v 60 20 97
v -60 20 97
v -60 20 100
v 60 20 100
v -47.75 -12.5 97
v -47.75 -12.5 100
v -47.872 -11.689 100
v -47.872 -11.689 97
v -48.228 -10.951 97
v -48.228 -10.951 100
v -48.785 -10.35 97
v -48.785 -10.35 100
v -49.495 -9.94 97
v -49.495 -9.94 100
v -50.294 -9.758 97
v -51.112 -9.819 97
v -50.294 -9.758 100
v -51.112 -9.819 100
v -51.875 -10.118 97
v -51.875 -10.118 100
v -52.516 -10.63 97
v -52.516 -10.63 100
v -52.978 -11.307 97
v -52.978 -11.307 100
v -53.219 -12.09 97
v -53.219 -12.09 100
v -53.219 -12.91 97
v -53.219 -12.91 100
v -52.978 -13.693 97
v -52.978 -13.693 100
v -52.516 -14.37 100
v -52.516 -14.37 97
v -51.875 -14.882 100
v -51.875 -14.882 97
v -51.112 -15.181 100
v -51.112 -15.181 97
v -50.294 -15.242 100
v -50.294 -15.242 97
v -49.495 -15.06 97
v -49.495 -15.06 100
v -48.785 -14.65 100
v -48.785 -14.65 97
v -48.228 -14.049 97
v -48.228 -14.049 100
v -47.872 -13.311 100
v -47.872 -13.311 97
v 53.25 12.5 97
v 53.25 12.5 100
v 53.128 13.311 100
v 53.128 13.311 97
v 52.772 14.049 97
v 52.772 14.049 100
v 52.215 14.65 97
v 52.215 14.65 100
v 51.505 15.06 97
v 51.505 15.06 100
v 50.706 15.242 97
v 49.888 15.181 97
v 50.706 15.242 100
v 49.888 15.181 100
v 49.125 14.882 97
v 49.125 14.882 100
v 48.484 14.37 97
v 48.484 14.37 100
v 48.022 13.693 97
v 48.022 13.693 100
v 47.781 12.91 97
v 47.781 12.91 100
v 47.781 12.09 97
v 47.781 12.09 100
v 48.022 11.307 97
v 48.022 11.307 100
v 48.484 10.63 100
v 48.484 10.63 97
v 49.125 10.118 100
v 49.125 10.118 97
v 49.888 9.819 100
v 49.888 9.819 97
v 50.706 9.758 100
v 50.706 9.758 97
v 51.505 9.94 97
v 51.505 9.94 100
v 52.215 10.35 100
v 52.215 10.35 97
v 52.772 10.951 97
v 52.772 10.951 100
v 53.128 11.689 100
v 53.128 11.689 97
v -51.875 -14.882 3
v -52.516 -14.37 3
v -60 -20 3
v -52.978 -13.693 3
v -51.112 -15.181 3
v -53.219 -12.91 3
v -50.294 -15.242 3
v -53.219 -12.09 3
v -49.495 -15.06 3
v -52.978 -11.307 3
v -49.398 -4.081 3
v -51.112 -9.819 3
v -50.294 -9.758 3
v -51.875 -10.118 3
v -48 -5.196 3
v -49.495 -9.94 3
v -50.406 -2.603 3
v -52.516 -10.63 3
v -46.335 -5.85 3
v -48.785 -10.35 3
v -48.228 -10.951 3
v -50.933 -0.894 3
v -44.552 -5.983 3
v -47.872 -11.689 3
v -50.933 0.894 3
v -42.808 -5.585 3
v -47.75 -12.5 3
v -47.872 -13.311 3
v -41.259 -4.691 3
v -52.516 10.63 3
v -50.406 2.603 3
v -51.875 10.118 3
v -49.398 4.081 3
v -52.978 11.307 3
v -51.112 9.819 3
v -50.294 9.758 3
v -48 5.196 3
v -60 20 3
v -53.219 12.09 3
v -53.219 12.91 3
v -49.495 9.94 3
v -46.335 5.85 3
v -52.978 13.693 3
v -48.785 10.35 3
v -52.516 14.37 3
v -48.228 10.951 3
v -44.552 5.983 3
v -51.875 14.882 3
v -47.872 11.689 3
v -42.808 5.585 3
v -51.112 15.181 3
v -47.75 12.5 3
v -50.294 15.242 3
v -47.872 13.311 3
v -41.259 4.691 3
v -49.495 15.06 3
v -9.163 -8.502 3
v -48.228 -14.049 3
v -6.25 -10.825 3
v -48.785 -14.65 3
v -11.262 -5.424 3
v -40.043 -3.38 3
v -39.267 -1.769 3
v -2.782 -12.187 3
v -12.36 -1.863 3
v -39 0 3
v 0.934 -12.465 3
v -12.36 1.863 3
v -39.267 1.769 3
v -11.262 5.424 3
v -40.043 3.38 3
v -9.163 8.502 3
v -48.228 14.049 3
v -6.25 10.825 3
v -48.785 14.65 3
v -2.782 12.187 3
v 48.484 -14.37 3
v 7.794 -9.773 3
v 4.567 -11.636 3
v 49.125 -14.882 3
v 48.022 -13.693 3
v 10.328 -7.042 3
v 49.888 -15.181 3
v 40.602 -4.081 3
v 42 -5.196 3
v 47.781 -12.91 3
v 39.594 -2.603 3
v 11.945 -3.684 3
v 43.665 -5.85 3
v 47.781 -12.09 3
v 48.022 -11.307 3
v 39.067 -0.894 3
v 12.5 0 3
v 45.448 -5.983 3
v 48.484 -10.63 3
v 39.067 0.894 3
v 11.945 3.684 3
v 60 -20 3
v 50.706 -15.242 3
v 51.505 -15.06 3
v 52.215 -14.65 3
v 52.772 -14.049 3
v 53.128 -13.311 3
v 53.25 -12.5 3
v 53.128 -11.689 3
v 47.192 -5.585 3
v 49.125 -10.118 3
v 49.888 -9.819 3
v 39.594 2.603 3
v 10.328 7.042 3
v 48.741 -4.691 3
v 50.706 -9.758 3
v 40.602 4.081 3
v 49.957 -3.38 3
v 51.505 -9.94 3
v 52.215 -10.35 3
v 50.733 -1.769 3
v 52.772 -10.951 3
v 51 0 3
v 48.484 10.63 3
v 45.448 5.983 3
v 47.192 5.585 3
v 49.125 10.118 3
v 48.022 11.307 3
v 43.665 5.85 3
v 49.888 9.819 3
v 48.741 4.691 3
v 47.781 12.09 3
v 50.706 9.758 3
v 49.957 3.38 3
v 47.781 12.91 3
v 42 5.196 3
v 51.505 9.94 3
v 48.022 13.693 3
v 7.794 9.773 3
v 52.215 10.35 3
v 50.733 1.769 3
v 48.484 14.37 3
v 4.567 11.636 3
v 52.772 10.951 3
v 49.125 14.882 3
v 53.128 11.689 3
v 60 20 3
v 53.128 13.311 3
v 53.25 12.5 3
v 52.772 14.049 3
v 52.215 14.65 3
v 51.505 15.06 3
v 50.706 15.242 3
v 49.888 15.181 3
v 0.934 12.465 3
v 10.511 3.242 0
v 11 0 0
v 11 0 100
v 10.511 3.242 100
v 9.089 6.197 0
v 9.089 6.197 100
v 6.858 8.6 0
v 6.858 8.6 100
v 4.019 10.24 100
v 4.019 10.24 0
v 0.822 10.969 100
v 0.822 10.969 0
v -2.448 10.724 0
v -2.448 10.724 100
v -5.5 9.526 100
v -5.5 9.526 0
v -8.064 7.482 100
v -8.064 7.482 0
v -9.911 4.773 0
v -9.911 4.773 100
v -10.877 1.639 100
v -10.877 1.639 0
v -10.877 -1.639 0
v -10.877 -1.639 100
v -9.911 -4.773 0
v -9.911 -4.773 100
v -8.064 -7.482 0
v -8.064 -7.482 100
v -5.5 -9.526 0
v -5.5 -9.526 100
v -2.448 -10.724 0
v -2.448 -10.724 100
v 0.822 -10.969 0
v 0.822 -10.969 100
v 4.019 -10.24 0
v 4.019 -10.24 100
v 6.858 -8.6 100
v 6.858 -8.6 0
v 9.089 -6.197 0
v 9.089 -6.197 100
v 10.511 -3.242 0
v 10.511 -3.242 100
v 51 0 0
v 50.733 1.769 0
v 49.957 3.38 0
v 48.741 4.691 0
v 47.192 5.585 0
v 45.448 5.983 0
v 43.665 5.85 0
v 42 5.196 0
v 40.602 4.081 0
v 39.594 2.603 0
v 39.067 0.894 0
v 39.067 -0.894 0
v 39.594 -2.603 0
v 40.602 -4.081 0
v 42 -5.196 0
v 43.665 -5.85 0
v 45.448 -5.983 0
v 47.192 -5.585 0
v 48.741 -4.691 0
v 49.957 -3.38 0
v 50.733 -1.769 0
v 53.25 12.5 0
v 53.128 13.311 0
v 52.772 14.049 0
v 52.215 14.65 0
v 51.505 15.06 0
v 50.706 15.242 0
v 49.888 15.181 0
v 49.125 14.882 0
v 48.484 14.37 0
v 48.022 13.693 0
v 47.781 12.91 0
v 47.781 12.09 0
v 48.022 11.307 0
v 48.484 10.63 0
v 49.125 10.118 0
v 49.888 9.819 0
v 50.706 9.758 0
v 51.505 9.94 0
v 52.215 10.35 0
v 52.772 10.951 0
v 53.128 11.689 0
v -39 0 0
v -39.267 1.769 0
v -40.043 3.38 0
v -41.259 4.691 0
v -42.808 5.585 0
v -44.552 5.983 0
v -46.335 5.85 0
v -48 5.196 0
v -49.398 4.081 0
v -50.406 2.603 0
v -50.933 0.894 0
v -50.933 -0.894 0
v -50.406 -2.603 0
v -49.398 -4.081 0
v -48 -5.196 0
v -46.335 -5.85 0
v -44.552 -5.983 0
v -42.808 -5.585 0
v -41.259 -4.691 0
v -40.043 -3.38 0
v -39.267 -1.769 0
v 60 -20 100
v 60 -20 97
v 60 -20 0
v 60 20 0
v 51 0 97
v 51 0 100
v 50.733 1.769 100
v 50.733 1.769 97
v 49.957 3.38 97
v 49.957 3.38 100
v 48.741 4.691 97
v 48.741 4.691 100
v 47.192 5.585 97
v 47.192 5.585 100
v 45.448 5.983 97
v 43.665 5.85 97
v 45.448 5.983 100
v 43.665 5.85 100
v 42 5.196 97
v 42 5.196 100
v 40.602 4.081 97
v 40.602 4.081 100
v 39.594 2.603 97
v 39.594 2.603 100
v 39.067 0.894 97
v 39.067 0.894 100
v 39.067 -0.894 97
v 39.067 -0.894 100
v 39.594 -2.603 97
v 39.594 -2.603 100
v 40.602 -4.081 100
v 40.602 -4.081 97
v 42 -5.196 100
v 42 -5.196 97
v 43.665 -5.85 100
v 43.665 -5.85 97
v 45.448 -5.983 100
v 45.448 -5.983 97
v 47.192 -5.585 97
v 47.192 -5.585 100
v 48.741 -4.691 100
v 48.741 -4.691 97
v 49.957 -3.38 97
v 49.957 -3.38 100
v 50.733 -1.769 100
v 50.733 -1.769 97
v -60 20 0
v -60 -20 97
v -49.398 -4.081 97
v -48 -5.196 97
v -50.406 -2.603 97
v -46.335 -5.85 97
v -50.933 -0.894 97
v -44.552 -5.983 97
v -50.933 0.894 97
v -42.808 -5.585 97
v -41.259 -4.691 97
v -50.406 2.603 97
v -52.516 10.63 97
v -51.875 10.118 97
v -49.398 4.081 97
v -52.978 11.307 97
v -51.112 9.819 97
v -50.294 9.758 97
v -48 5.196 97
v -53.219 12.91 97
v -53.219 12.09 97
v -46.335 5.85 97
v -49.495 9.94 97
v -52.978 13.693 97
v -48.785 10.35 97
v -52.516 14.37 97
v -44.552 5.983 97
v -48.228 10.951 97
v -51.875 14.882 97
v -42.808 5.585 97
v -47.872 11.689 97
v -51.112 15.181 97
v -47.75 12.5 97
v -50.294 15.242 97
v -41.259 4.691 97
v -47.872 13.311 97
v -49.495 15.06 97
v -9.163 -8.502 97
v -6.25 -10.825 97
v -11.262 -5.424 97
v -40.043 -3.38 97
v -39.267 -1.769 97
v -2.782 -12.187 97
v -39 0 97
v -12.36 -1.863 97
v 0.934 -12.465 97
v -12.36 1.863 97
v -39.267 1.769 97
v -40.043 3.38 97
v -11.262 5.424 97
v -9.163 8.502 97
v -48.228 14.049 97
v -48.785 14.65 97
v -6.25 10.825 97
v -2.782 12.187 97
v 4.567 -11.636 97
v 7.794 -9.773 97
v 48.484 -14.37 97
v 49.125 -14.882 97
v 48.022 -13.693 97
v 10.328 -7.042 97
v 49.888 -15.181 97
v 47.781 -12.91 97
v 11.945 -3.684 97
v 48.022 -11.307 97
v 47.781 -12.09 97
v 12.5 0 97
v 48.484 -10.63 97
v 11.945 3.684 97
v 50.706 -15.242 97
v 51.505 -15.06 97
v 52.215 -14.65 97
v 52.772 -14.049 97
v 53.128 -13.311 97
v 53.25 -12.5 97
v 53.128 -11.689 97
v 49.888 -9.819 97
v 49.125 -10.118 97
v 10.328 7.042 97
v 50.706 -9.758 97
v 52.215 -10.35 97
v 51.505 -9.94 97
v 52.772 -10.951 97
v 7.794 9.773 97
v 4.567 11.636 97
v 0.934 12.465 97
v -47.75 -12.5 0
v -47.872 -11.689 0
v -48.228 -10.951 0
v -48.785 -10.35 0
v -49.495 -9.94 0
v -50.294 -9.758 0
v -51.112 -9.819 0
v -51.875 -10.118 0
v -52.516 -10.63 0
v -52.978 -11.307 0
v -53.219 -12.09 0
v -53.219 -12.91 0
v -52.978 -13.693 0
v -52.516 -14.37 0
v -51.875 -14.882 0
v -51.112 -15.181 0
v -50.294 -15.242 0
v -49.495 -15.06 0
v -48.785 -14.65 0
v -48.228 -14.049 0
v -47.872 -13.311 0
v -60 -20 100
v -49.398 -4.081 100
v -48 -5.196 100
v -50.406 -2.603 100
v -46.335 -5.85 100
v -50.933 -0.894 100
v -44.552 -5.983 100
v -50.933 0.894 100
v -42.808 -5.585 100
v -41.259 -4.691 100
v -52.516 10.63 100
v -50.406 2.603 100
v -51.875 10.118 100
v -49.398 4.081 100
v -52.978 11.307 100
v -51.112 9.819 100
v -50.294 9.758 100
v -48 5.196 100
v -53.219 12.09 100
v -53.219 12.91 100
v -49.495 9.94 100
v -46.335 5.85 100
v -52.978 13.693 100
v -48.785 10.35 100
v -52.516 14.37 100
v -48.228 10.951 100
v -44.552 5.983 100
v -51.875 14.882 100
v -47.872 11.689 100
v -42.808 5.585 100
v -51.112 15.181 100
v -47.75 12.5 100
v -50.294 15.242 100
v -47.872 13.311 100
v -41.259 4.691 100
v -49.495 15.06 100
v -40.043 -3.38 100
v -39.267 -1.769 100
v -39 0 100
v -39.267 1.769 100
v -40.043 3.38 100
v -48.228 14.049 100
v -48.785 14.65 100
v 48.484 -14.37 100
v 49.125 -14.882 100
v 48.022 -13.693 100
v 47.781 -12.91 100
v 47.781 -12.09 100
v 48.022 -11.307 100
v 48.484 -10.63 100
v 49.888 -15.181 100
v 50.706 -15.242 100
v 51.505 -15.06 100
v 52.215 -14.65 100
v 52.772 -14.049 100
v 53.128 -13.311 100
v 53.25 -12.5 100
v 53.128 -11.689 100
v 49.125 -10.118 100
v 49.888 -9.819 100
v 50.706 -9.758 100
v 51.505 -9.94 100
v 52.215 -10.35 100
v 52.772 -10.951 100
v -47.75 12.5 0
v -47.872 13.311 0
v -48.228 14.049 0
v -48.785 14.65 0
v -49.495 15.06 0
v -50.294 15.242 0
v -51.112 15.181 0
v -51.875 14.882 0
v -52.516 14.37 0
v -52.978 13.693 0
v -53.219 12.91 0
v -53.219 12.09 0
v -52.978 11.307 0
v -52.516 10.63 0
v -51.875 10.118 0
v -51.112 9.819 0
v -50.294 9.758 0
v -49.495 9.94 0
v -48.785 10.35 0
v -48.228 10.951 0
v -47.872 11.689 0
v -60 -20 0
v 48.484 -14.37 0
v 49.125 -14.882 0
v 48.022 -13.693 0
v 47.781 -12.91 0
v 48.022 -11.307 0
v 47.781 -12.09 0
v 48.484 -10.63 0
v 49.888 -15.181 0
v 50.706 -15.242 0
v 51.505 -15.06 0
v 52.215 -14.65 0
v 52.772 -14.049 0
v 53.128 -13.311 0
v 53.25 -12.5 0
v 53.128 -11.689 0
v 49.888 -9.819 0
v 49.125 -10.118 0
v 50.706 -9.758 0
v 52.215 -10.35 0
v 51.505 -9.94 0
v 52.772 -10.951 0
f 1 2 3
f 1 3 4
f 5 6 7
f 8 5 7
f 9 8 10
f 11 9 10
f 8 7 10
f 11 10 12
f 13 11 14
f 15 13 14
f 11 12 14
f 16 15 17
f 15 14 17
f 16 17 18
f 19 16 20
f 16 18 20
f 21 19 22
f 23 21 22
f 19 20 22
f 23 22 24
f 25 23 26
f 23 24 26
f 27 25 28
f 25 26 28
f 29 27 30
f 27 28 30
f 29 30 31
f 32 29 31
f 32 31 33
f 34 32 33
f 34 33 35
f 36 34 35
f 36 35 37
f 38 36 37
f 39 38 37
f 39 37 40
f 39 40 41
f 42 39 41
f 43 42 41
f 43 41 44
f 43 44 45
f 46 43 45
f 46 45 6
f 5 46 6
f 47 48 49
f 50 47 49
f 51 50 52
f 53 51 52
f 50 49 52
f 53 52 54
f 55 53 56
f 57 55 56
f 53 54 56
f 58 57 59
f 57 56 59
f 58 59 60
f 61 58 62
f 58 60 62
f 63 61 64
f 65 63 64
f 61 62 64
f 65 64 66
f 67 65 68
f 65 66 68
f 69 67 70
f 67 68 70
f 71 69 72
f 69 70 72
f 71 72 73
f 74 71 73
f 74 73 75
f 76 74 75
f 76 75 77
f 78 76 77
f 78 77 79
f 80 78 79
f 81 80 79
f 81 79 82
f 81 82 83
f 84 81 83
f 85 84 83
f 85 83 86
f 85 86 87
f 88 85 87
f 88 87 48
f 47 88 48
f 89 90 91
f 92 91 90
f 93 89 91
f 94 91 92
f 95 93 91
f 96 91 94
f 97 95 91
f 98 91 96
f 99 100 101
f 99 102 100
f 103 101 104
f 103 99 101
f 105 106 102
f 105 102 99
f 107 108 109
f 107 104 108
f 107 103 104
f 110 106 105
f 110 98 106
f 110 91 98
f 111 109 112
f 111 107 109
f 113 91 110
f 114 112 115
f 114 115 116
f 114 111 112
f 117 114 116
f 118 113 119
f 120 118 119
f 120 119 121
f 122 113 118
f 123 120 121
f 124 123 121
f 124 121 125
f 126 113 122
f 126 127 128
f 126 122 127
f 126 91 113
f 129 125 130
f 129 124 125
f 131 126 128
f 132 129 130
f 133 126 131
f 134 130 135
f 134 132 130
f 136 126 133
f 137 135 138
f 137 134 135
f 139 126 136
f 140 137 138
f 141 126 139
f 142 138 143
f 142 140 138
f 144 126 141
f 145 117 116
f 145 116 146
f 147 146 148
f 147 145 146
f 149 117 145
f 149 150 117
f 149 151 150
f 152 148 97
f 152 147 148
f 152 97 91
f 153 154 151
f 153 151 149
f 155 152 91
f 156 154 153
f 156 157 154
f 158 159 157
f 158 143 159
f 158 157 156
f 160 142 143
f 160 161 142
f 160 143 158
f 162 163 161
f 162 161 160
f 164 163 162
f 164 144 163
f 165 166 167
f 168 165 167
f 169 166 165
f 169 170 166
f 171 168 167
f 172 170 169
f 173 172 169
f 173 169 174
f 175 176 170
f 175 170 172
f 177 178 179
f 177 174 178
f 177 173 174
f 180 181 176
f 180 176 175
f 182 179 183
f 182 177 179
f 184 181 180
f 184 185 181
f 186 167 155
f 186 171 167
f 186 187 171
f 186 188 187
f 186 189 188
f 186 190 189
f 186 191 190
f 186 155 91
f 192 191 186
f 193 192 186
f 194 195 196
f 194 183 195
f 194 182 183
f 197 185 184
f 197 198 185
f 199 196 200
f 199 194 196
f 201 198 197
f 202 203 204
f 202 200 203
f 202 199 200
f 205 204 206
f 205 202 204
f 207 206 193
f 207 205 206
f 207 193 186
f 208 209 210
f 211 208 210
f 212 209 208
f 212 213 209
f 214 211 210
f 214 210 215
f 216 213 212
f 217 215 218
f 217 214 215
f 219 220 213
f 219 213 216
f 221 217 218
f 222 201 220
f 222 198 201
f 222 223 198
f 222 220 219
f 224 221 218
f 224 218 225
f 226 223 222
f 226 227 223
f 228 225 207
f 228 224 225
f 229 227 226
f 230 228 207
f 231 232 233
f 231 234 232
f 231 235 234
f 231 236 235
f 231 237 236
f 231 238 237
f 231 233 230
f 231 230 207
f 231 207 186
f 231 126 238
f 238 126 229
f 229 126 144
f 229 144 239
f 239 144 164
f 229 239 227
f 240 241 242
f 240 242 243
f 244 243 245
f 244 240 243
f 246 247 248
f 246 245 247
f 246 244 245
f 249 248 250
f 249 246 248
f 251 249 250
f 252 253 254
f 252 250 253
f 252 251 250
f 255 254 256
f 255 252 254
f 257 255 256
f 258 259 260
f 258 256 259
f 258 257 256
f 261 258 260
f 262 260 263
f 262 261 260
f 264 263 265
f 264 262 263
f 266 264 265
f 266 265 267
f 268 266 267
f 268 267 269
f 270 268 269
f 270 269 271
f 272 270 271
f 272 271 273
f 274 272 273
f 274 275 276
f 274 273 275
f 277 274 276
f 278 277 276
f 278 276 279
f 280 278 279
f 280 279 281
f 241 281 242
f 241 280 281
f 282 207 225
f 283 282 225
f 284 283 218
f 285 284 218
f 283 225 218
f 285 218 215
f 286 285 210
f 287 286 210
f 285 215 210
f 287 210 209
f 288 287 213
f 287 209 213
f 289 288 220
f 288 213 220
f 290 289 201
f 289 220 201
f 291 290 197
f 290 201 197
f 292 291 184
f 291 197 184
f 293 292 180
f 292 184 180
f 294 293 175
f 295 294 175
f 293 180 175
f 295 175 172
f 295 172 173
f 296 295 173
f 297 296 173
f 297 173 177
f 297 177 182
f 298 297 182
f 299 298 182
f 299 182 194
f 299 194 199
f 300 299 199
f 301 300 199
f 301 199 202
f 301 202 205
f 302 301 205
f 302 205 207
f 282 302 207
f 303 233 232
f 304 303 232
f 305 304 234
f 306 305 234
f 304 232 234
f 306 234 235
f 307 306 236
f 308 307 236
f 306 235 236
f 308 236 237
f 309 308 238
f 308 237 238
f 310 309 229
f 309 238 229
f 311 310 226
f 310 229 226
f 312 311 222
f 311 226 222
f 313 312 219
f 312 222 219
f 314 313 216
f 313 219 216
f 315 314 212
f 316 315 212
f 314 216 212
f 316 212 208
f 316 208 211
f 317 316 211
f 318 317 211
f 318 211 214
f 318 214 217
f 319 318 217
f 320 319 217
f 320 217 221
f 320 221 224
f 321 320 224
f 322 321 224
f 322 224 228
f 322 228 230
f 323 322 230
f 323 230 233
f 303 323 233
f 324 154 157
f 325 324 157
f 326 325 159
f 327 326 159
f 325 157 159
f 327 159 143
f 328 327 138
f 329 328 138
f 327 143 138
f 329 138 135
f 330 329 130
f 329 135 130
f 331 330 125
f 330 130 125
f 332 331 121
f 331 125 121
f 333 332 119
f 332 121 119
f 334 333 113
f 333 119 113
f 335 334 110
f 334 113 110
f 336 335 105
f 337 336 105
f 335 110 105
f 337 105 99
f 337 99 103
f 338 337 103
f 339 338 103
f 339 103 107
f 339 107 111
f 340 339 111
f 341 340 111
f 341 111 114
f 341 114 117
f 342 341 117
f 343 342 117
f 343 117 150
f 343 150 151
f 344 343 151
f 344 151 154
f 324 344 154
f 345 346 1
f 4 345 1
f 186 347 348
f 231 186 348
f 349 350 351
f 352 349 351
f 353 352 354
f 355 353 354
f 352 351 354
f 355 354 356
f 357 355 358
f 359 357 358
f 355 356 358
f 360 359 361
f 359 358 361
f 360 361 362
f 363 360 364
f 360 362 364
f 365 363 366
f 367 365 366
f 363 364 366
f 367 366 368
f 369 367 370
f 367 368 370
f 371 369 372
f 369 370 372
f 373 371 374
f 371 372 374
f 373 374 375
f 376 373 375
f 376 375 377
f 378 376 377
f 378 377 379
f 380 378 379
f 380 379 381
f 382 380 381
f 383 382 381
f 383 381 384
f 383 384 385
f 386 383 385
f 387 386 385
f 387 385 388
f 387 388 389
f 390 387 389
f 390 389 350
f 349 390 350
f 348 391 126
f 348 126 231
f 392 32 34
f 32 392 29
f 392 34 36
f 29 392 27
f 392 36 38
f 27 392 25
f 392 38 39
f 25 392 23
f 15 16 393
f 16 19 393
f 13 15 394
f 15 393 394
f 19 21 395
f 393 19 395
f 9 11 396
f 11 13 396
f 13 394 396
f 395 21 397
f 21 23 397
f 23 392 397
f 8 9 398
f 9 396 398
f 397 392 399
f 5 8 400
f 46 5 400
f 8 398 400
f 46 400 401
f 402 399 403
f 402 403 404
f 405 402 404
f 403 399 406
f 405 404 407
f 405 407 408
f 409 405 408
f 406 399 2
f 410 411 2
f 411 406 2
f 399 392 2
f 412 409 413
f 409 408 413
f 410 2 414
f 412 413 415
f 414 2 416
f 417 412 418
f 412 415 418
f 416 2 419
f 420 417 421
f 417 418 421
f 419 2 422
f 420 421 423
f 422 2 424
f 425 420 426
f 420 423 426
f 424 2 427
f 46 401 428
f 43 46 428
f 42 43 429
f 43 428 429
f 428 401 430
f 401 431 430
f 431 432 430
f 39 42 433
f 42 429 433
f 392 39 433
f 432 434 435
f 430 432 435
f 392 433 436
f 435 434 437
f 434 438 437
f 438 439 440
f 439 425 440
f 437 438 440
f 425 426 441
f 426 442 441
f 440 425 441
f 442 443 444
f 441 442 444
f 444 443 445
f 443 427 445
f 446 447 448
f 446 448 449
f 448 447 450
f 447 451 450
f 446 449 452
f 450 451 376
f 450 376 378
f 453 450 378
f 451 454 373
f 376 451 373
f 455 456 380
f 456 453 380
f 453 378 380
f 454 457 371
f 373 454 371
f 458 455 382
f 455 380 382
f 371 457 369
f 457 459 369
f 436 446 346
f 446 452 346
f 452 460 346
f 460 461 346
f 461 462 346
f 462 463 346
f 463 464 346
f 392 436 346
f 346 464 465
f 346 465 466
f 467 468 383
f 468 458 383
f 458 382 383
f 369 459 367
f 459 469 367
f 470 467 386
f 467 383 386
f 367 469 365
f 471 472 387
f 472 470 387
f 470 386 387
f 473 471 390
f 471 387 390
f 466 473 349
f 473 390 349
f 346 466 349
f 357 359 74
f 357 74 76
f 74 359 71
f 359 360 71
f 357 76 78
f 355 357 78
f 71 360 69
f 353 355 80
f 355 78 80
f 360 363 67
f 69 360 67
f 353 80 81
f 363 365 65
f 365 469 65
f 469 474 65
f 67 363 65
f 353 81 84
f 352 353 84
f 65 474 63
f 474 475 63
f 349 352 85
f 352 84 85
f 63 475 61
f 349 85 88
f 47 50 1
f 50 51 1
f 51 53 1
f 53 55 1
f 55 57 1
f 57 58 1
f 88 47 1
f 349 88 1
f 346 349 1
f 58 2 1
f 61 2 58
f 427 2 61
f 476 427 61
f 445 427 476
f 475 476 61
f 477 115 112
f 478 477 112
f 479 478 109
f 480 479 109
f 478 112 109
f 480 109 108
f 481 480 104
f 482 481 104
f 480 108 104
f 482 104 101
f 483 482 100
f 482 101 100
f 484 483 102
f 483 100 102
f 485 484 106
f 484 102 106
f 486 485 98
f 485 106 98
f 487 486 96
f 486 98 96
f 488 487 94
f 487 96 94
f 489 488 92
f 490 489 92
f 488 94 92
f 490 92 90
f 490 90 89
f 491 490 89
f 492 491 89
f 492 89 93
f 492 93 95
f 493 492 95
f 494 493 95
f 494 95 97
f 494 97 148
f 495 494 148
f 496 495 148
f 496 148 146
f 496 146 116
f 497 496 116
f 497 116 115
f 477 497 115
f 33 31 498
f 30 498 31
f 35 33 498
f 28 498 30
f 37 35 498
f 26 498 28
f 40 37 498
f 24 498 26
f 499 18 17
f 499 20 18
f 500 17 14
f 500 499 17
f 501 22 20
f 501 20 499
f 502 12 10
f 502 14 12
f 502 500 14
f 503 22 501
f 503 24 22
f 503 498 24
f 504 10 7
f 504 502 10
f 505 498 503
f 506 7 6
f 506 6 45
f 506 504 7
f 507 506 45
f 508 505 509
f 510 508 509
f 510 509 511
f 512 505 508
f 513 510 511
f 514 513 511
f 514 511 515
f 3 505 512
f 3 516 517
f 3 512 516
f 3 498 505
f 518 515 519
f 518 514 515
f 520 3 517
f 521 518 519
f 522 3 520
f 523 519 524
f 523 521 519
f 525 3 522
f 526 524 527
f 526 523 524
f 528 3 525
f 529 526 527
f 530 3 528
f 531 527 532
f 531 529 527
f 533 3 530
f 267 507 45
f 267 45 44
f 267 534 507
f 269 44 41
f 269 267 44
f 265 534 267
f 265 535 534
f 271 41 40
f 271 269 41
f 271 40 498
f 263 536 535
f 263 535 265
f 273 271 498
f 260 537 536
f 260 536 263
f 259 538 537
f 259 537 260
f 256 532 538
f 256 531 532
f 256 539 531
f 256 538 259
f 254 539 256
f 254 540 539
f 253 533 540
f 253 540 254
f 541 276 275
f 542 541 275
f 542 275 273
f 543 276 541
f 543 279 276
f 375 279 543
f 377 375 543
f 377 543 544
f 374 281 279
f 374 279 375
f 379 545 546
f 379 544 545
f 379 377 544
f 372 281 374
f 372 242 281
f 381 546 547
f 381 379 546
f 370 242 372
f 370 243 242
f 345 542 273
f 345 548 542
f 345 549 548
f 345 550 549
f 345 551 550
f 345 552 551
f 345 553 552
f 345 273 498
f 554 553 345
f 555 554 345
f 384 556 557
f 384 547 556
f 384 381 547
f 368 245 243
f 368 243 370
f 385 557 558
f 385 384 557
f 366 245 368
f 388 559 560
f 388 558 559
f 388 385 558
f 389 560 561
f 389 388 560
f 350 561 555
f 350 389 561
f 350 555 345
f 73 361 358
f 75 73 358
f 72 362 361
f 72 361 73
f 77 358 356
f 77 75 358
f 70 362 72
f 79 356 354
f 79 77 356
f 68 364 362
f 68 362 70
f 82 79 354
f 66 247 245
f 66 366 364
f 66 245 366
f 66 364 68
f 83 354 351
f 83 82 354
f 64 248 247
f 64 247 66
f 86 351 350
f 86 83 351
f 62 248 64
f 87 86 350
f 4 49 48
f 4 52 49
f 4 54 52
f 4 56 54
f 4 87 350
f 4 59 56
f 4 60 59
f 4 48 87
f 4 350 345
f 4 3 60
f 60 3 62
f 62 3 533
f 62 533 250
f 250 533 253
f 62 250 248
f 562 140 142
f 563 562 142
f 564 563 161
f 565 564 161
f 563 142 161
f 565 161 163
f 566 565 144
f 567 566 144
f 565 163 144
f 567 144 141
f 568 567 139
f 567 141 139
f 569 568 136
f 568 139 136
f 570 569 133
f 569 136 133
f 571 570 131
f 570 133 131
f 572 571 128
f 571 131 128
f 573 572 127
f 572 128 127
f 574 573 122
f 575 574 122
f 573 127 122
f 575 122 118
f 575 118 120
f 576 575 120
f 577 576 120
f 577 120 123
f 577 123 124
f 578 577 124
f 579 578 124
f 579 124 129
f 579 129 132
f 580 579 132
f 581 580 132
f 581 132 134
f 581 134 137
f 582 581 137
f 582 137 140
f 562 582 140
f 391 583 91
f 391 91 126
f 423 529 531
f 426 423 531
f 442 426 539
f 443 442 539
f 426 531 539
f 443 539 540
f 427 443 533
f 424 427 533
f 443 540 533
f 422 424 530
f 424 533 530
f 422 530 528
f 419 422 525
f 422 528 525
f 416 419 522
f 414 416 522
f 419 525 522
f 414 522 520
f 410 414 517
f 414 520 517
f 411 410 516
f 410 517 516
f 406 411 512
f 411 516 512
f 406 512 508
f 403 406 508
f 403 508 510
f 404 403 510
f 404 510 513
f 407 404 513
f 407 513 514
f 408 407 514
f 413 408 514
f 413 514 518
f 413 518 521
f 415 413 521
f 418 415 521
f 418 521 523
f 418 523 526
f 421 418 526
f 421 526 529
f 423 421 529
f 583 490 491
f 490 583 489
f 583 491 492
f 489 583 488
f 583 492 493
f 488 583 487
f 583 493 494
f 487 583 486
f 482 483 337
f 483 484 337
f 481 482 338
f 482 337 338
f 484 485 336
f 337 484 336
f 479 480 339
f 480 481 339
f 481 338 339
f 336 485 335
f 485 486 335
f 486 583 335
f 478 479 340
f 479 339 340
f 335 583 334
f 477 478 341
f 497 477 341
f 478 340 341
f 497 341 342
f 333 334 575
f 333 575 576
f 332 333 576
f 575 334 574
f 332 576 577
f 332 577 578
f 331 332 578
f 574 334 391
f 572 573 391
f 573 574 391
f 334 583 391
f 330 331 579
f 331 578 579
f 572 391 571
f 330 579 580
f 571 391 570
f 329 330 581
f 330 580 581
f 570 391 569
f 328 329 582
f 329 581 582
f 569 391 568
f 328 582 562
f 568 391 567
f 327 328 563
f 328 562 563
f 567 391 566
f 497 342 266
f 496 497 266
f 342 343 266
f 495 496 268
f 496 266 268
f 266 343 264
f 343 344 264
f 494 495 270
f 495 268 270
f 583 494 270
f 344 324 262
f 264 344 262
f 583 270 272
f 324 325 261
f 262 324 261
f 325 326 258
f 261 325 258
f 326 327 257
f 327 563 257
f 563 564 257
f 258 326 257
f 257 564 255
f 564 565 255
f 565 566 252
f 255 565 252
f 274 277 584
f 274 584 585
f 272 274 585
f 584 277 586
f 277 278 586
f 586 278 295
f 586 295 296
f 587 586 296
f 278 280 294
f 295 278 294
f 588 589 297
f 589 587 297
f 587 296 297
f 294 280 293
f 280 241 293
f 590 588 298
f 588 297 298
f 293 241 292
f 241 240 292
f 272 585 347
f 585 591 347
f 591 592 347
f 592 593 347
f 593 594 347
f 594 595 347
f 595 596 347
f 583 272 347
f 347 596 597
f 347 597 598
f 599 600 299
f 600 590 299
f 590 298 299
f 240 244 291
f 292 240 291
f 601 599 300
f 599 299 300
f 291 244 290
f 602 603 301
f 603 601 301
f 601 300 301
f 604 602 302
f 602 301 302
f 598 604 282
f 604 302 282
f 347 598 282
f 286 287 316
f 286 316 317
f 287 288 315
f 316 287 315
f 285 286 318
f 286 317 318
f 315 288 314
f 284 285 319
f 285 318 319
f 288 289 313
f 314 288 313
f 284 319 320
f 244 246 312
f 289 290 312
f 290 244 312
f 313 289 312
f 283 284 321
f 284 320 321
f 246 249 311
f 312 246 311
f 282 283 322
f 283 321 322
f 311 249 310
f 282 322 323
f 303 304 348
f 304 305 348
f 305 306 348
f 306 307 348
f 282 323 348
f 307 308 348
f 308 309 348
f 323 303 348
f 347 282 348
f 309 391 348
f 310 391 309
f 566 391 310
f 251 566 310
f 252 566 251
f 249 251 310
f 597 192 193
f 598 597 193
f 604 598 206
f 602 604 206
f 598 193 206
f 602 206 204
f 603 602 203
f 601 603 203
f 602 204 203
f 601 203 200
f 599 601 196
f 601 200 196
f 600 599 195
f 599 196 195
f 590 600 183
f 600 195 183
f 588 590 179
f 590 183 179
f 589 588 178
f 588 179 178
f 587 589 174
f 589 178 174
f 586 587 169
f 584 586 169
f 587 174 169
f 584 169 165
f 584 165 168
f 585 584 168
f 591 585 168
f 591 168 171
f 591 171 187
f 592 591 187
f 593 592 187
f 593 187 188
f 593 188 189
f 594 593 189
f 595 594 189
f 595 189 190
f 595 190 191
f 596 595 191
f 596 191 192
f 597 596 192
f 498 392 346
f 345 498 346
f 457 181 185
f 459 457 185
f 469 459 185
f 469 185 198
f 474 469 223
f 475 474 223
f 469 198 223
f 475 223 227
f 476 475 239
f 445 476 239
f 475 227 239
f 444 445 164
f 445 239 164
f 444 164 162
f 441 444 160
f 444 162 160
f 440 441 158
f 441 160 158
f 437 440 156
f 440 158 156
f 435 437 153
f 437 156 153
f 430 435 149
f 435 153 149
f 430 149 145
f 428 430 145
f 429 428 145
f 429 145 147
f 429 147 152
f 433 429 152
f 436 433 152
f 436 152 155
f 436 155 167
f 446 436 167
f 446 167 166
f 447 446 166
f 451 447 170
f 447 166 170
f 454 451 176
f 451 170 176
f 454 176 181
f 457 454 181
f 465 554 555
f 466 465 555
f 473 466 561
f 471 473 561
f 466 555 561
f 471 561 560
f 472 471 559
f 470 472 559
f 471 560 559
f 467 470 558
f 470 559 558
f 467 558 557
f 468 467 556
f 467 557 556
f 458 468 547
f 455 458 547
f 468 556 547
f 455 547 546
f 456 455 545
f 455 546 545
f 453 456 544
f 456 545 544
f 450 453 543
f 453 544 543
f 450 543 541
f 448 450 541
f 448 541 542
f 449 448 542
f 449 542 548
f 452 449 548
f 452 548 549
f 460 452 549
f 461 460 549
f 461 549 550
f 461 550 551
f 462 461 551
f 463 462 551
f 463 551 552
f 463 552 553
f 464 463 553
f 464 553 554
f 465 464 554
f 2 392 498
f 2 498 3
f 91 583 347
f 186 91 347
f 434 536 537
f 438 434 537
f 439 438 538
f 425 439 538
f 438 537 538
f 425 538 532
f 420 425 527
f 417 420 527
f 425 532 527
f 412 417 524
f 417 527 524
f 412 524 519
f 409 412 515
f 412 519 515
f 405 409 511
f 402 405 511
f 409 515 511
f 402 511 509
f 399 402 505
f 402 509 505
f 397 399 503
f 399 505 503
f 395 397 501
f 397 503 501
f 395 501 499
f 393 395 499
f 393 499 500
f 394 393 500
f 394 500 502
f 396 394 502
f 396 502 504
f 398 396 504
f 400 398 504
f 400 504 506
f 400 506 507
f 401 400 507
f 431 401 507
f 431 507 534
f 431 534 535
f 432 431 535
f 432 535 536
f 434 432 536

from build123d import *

# Parameters (mm, degrees)
SKETCH_1_W               = 120
SKETCH_1_H               = 40
EXTRUDE_1_DEPTH          = 3
SKETCH_2_R               = 12.5
EXTRUDE_2_DEPTH          = 94
SKETCH_3_W               = 120
SKETCH_3_H               = 40
EXTRUDE_3_DEPTH          = 3
CUT_EXTRUDE_1_DEPTH      = 119.321595662
CUT_EXTRUDE_1_DEPTH_BACK = 119.321595662
SKETCH_4_R               = 11
SKETCH_5_R               = 2.75
CUT_EXTRUDE_2_DEPTH      = 119.321595662
SKETCH_6_R               = 6
CUT_EXTRUDE_3_DEPTH      = 119.321595662


with BuildPart() as part:
    # 草图1 → 凸台-拉伸1 (new body)
    with BuildSketch(Plane.XY):
        Rectangle(SKETCH_1_W, SKETCH_1_H)
    extrude(amount=EXTRUDE_1_DEPTH)

    # 草图2 → 凸台-拉伸2 (add)
    with BuildSketch(Plane.XY.offset(3)):
        Circle(SKETCH_2_R)
    extrude(amount=EXTRUDE_2_DEPTH)

    # 草图3 → 凸台-拉伸3 (add)
    with BuildSketch(Plane.XY.offset(97)):
        Rectangle(SKETCH_3_W, SKETCH_3_H)
    extrude(amount=EXTRUDE_3_DEPTH)

    # 草图4 → 切除-拉伸1 (cut, two sides: drawn at the far end of the back side and taken through both)
    with BuildSketch(Plane.XY.offset(100).offset(-CUT_EXTRUDE_1_DEPTH_BACK)):
        Circle(SKETCH_4_R)
    extrude(amount=CUT_EXTRUDE_1_DEPTH + CUT_EXTRUDE_1_DEPTH_BACK, mode=Mode.SUBTRACT)

    # 草图5 → 切除-拉伸2 (cut, through all)
    with BuildSketch(Plane.XY.offset(100)):
        with Locations((-50.5, 12.5)):
            Circle(SKETCH_5_R)
        with Locations((-50.5, -12.5)):
            Circle(SKETCH_5_R)
        with Locations((50.5, 12.5)):
            Circle(SKETCH_5_R)
        with Locations((50.5, -12.5)):
            Circle(SKETCH_5_R)
    extrude(amount=-CUT_EXTRUDE_2_DEPTH, mode=Mode.SUBTRACT)

    # 草图6 → 切除-拉伸3 (cut, through all)
    with BuildSketch(Plane.XY.offset(100)):
        with Locations((45, 0)):
            Circle(SKETCH_6_R)
        with Locations((-45, 0)):
            Circle(SKETCH_6_R)
    extrude(amount=-CUT_EXTRUDE_3_DEPTH, mode=Mode.SUBTRACT)


solid = part.part
